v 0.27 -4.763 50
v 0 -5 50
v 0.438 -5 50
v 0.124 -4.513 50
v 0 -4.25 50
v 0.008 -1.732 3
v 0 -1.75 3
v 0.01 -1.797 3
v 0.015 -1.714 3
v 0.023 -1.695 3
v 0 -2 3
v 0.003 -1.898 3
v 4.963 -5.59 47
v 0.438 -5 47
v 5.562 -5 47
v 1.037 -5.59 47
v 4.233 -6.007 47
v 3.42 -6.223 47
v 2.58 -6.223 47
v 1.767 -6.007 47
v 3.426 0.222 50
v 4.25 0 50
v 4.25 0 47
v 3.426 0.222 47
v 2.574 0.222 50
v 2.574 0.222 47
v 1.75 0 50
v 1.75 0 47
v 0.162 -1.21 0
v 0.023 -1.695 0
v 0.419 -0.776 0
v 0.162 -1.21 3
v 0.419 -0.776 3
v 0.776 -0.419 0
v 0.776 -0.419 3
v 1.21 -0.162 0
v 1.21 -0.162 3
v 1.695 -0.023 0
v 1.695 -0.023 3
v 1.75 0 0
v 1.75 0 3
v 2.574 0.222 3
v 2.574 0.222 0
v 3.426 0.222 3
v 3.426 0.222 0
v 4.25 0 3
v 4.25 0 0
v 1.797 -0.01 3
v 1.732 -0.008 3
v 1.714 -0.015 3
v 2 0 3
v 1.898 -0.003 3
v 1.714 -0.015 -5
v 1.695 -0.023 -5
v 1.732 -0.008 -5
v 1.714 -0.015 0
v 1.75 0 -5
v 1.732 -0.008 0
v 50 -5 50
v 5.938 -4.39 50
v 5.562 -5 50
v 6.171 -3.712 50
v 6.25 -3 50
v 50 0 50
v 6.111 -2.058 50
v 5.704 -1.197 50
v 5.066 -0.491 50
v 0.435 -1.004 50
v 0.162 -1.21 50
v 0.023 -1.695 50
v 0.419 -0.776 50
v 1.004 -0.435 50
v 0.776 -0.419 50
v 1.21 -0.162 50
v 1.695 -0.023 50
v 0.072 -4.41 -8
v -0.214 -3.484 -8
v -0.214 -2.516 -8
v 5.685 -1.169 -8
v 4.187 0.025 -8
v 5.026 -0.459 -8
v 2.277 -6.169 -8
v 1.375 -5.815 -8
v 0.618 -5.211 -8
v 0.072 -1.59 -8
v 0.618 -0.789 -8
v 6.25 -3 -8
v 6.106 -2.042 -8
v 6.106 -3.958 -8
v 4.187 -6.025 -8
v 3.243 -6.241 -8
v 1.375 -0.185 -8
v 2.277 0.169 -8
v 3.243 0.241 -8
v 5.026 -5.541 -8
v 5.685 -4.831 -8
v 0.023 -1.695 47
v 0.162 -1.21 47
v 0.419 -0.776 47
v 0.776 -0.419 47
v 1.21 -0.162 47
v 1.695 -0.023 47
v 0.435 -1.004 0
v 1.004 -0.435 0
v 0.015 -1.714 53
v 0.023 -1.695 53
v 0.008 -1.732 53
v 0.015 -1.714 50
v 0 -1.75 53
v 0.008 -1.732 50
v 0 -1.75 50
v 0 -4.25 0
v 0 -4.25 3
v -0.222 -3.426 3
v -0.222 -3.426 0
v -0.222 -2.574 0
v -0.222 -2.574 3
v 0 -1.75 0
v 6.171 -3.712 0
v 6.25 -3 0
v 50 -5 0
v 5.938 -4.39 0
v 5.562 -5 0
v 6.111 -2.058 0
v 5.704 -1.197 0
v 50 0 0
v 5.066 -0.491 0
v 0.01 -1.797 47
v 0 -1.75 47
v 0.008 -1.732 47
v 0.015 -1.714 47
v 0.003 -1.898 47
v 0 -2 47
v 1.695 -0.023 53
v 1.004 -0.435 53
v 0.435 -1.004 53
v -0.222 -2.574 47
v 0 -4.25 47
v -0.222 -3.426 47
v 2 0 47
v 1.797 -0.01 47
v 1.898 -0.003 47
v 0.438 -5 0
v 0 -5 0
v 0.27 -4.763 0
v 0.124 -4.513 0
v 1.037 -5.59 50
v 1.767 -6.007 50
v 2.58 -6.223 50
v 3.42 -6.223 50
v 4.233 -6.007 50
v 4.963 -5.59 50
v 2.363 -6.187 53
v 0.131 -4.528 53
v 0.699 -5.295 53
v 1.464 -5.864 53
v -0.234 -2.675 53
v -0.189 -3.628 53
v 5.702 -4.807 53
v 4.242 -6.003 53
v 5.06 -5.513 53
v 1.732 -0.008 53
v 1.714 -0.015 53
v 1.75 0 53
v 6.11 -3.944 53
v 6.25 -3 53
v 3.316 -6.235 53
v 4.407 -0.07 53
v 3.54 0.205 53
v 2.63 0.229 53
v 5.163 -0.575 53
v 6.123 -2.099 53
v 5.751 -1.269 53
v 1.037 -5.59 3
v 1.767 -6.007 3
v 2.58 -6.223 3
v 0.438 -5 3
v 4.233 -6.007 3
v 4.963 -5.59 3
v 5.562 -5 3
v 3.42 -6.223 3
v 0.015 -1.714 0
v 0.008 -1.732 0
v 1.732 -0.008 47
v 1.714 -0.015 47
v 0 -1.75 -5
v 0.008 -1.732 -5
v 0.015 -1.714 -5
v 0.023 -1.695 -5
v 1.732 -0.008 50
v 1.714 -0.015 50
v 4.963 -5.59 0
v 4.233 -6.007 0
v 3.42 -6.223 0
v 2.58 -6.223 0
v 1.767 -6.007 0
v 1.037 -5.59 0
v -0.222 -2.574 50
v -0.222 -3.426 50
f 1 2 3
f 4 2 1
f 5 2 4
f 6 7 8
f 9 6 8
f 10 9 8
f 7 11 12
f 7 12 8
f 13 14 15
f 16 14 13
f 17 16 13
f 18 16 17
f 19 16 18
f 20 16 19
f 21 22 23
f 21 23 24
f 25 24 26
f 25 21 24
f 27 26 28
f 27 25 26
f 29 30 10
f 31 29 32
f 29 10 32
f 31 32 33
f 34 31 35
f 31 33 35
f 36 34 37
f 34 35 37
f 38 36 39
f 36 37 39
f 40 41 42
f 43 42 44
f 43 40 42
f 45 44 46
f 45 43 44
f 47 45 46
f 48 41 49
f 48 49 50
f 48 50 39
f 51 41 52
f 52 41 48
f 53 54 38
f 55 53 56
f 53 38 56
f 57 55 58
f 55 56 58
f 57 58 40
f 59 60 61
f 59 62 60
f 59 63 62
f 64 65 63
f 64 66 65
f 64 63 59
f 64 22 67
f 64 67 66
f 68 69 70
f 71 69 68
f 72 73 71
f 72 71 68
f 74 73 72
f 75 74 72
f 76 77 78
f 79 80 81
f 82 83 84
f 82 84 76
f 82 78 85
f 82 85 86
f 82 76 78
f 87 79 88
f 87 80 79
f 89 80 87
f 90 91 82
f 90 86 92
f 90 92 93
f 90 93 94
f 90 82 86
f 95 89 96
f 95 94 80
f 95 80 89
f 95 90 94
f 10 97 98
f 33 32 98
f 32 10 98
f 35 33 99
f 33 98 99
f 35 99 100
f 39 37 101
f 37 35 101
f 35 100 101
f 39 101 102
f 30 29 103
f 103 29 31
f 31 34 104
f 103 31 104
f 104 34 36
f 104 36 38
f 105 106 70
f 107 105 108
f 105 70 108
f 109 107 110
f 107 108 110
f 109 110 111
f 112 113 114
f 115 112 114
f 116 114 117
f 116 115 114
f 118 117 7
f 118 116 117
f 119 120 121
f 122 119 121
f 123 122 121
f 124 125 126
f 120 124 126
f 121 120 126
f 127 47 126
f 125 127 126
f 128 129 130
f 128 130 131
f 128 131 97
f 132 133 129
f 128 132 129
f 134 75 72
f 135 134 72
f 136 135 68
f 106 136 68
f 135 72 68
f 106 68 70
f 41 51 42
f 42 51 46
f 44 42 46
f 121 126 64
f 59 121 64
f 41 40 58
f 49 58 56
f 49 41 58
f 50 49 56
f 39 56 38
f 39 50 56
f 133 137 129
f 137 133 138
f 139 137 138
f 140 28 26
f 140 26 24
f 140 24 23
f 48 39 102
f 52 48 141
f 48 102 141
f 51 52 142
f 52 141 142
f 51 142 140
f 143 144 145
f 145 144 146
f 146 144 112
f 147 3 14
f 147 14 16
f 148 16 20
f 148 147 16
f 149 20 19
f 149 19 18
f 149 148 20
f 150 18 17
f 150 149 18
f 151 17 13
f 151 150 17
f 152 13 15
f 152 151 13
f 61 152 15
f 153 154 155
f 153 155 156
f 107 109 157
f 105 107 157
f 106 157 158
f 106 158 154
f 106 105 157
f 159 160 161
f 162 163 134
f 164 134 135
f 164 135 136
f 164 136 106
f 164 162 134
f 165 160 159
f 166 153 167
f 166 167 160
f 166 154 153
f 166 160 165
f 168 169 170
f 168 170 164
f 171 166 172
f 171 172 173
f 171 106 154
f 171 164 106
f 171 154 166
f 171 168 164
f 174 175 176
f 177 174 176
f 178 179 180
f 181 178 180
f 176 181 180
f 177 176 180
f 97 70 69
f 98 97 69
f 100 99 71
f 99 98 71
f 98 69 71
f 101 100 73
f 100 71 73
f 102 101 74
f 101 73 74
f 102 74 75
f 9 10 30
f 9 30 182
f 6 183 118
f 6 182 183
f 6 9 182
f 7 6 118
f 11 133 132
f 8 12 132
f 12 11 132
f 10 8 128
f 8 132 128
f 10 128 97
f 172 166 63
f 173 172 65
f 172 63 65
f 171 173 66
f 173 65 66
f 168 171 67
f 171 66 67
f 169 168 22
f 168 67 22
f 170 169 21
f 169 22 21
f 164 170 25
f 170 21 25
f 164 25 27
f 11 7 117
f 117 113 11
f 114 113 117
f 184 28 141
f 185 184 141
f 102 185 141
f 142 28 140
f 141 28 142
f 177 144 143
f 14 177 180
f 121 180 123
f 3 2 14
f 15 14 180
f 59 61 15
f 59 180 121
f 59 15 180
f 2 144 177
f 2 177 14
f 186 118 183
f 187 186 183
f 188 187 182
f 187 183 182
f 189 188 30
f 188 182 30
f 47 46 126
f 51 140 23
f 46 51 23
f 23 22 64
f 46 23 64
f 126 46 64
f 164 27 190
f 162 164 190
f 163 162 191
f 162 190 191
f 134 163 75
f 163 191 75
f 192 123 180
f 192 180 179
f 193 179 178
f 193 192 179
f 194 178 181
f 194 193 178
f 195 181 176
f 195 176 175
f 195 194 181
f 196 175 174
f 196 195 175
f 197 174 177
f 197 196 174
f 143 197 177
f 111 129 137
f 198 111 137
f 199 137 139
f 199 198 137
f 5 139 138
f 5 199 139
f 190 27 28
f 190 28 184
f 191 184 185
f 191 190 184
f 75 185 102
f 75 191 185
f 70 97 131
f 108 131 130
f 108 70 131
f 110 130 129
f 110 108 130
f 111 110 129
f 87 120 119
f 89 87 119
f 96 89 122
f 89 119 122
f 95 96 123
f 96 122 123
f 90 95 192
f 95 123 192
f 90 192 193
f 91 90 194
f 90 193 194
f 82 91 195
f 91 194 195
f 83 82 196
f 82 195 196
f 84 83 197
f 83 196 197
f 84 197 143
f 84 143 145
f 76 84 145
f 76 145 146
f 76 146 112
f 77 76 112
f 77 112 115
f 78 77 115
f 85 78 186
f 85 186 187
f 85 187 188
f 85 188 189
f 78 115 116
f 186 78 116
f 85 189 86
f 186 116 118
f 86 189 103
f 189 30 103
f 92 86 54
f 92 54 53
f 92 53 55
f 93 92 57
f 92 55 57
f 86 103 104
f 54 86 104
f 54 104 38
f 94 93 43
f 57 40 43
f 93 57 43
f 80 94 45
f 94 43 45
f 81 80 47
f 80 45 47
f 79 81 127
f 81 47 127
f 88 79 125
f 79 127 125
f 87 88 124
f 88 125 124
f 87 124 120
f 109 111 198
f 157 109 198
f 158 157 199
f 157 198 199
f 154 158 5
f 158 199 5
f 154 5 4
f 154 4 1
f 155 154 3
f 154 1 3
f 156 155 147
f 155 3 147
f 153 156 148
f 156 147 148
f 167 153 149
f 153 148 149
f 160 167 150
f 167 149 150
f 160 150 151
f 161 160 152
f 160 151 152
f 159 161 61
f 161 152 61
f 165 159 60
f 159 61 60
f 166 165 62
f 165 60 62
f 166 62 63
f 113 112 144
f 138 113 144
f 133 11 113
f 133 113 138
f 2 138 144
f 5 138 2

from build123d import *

# Parameters (mm, degrees)
F0_W          = 50
F0_H          = 50
F1_DEPTH      = 5
F2_R          = 3.25
F3_DEPTH      = 8
F3_DEPTH_BACK = 3
F4_R          = 3.25
F5_DEPTH      = 3
F5_DEPTH_BACK = 3
F6_T4_DEPTH   = 60
F6_S5_R       = 3.25
F6_T6_DEPTH   = 32
F6_T10_DEPTH  = 60


# Not quite as in the source:
# - a fillet or chamfer that OpenCascade refuses, or shapes differently, is made with other operations: its cross-section is extruded or revolved along the edge and cut away or added


with BuildPart() as f1:
    # F0 (on Front) → F1 (new body)
    with BuildSketch(Plane.XZ):
        with Locations((25, 25)):
            Rectangle(F0_W, F0_H)
    extrude(amount=F1_DEPTH)

    # F2 (on face) → F3 (join, two sides)
    with BuildSketch(Plane(origin=(0, 0, 0), x_dir=(1, 0, 0), z_dir=(0, 0, -1))) as f3_sk:
        with Locations((3, 3)):
            Circle(F2_R)
    extrude(amount=F3_DEPTH)
    extrude(f3_sk.sketch, amount=-F3_DEPTH_BACK)

    # F4 (on face) → F5 (join, two sides)
    with BuildSketch(Plane.XY.offset(50)) as f5_sk:
        with Locations((3, -3)):
            Circle(F4_R)
    extrude(amount=F5_DEPTH)
    extrude(f5_sk.sketch, amount=-F5_DEPTH_BACK)

    # F6: fillet of radius 2 on 1 edges, made by hand


with BuildPart() as f6_tool2:
    # F6_s3 → F6_t4 (new body)
    with BuildSketch(Plane.XY.offset(55)):
        with BuildLine():
            ThreePointArc((0, -2), (0.5857864376, -0.5857864376), (2, 0))
            Line((2, 0), (0, 0))
            Line((0, 0), (0, -2))
        make_face()
    extrude(amount=-F6_T4_DEPTH)

    # F6_s5 → F6_t6 (cut, symmetric)
    with BuildSketch(Plane.XY.offset(25)):
        with Locations((3, -3)):
            Circle(F6_S5_R)
    extrude(amount=F6_T6_DEPTH, both=True, mode=Mode.SUBTRACT)


with BuildPart() as f1_1:
    add(f1.part)

    # F6_t1: cut F6_tool2
    add(f6_tool2.part, mode=Mode.SUBTRACT)


with BuildPart() as f6_tool8:
    # F6_s9 → F6_t10 (new body)
    with BuildSketch(Plane.XY.offset(55)):
        with BuildLine():
            ThreePointArc((0, -2), (0.5857864376, -0.5857864376), (2, 0))
            Line((2, 0), (0, 0))
            Line((0, 0), (0, -2))
        make_face()
    extrude(amount=-F6_T10_DEPTH)

    split(bisect_by=Plane.XY.offset(3), keep=Keep.TOP)

    split(bisect_by=Plane.XY.offset(47), keep=Keep.BOTTOM)


with BuildPart() as f1_2:
    add(f1_1.part)

    # F6_t7: cut F6_tool8
    add(f6_tool8.part, mode=Mode.SUBTRACT)


solid = f1_2.part
